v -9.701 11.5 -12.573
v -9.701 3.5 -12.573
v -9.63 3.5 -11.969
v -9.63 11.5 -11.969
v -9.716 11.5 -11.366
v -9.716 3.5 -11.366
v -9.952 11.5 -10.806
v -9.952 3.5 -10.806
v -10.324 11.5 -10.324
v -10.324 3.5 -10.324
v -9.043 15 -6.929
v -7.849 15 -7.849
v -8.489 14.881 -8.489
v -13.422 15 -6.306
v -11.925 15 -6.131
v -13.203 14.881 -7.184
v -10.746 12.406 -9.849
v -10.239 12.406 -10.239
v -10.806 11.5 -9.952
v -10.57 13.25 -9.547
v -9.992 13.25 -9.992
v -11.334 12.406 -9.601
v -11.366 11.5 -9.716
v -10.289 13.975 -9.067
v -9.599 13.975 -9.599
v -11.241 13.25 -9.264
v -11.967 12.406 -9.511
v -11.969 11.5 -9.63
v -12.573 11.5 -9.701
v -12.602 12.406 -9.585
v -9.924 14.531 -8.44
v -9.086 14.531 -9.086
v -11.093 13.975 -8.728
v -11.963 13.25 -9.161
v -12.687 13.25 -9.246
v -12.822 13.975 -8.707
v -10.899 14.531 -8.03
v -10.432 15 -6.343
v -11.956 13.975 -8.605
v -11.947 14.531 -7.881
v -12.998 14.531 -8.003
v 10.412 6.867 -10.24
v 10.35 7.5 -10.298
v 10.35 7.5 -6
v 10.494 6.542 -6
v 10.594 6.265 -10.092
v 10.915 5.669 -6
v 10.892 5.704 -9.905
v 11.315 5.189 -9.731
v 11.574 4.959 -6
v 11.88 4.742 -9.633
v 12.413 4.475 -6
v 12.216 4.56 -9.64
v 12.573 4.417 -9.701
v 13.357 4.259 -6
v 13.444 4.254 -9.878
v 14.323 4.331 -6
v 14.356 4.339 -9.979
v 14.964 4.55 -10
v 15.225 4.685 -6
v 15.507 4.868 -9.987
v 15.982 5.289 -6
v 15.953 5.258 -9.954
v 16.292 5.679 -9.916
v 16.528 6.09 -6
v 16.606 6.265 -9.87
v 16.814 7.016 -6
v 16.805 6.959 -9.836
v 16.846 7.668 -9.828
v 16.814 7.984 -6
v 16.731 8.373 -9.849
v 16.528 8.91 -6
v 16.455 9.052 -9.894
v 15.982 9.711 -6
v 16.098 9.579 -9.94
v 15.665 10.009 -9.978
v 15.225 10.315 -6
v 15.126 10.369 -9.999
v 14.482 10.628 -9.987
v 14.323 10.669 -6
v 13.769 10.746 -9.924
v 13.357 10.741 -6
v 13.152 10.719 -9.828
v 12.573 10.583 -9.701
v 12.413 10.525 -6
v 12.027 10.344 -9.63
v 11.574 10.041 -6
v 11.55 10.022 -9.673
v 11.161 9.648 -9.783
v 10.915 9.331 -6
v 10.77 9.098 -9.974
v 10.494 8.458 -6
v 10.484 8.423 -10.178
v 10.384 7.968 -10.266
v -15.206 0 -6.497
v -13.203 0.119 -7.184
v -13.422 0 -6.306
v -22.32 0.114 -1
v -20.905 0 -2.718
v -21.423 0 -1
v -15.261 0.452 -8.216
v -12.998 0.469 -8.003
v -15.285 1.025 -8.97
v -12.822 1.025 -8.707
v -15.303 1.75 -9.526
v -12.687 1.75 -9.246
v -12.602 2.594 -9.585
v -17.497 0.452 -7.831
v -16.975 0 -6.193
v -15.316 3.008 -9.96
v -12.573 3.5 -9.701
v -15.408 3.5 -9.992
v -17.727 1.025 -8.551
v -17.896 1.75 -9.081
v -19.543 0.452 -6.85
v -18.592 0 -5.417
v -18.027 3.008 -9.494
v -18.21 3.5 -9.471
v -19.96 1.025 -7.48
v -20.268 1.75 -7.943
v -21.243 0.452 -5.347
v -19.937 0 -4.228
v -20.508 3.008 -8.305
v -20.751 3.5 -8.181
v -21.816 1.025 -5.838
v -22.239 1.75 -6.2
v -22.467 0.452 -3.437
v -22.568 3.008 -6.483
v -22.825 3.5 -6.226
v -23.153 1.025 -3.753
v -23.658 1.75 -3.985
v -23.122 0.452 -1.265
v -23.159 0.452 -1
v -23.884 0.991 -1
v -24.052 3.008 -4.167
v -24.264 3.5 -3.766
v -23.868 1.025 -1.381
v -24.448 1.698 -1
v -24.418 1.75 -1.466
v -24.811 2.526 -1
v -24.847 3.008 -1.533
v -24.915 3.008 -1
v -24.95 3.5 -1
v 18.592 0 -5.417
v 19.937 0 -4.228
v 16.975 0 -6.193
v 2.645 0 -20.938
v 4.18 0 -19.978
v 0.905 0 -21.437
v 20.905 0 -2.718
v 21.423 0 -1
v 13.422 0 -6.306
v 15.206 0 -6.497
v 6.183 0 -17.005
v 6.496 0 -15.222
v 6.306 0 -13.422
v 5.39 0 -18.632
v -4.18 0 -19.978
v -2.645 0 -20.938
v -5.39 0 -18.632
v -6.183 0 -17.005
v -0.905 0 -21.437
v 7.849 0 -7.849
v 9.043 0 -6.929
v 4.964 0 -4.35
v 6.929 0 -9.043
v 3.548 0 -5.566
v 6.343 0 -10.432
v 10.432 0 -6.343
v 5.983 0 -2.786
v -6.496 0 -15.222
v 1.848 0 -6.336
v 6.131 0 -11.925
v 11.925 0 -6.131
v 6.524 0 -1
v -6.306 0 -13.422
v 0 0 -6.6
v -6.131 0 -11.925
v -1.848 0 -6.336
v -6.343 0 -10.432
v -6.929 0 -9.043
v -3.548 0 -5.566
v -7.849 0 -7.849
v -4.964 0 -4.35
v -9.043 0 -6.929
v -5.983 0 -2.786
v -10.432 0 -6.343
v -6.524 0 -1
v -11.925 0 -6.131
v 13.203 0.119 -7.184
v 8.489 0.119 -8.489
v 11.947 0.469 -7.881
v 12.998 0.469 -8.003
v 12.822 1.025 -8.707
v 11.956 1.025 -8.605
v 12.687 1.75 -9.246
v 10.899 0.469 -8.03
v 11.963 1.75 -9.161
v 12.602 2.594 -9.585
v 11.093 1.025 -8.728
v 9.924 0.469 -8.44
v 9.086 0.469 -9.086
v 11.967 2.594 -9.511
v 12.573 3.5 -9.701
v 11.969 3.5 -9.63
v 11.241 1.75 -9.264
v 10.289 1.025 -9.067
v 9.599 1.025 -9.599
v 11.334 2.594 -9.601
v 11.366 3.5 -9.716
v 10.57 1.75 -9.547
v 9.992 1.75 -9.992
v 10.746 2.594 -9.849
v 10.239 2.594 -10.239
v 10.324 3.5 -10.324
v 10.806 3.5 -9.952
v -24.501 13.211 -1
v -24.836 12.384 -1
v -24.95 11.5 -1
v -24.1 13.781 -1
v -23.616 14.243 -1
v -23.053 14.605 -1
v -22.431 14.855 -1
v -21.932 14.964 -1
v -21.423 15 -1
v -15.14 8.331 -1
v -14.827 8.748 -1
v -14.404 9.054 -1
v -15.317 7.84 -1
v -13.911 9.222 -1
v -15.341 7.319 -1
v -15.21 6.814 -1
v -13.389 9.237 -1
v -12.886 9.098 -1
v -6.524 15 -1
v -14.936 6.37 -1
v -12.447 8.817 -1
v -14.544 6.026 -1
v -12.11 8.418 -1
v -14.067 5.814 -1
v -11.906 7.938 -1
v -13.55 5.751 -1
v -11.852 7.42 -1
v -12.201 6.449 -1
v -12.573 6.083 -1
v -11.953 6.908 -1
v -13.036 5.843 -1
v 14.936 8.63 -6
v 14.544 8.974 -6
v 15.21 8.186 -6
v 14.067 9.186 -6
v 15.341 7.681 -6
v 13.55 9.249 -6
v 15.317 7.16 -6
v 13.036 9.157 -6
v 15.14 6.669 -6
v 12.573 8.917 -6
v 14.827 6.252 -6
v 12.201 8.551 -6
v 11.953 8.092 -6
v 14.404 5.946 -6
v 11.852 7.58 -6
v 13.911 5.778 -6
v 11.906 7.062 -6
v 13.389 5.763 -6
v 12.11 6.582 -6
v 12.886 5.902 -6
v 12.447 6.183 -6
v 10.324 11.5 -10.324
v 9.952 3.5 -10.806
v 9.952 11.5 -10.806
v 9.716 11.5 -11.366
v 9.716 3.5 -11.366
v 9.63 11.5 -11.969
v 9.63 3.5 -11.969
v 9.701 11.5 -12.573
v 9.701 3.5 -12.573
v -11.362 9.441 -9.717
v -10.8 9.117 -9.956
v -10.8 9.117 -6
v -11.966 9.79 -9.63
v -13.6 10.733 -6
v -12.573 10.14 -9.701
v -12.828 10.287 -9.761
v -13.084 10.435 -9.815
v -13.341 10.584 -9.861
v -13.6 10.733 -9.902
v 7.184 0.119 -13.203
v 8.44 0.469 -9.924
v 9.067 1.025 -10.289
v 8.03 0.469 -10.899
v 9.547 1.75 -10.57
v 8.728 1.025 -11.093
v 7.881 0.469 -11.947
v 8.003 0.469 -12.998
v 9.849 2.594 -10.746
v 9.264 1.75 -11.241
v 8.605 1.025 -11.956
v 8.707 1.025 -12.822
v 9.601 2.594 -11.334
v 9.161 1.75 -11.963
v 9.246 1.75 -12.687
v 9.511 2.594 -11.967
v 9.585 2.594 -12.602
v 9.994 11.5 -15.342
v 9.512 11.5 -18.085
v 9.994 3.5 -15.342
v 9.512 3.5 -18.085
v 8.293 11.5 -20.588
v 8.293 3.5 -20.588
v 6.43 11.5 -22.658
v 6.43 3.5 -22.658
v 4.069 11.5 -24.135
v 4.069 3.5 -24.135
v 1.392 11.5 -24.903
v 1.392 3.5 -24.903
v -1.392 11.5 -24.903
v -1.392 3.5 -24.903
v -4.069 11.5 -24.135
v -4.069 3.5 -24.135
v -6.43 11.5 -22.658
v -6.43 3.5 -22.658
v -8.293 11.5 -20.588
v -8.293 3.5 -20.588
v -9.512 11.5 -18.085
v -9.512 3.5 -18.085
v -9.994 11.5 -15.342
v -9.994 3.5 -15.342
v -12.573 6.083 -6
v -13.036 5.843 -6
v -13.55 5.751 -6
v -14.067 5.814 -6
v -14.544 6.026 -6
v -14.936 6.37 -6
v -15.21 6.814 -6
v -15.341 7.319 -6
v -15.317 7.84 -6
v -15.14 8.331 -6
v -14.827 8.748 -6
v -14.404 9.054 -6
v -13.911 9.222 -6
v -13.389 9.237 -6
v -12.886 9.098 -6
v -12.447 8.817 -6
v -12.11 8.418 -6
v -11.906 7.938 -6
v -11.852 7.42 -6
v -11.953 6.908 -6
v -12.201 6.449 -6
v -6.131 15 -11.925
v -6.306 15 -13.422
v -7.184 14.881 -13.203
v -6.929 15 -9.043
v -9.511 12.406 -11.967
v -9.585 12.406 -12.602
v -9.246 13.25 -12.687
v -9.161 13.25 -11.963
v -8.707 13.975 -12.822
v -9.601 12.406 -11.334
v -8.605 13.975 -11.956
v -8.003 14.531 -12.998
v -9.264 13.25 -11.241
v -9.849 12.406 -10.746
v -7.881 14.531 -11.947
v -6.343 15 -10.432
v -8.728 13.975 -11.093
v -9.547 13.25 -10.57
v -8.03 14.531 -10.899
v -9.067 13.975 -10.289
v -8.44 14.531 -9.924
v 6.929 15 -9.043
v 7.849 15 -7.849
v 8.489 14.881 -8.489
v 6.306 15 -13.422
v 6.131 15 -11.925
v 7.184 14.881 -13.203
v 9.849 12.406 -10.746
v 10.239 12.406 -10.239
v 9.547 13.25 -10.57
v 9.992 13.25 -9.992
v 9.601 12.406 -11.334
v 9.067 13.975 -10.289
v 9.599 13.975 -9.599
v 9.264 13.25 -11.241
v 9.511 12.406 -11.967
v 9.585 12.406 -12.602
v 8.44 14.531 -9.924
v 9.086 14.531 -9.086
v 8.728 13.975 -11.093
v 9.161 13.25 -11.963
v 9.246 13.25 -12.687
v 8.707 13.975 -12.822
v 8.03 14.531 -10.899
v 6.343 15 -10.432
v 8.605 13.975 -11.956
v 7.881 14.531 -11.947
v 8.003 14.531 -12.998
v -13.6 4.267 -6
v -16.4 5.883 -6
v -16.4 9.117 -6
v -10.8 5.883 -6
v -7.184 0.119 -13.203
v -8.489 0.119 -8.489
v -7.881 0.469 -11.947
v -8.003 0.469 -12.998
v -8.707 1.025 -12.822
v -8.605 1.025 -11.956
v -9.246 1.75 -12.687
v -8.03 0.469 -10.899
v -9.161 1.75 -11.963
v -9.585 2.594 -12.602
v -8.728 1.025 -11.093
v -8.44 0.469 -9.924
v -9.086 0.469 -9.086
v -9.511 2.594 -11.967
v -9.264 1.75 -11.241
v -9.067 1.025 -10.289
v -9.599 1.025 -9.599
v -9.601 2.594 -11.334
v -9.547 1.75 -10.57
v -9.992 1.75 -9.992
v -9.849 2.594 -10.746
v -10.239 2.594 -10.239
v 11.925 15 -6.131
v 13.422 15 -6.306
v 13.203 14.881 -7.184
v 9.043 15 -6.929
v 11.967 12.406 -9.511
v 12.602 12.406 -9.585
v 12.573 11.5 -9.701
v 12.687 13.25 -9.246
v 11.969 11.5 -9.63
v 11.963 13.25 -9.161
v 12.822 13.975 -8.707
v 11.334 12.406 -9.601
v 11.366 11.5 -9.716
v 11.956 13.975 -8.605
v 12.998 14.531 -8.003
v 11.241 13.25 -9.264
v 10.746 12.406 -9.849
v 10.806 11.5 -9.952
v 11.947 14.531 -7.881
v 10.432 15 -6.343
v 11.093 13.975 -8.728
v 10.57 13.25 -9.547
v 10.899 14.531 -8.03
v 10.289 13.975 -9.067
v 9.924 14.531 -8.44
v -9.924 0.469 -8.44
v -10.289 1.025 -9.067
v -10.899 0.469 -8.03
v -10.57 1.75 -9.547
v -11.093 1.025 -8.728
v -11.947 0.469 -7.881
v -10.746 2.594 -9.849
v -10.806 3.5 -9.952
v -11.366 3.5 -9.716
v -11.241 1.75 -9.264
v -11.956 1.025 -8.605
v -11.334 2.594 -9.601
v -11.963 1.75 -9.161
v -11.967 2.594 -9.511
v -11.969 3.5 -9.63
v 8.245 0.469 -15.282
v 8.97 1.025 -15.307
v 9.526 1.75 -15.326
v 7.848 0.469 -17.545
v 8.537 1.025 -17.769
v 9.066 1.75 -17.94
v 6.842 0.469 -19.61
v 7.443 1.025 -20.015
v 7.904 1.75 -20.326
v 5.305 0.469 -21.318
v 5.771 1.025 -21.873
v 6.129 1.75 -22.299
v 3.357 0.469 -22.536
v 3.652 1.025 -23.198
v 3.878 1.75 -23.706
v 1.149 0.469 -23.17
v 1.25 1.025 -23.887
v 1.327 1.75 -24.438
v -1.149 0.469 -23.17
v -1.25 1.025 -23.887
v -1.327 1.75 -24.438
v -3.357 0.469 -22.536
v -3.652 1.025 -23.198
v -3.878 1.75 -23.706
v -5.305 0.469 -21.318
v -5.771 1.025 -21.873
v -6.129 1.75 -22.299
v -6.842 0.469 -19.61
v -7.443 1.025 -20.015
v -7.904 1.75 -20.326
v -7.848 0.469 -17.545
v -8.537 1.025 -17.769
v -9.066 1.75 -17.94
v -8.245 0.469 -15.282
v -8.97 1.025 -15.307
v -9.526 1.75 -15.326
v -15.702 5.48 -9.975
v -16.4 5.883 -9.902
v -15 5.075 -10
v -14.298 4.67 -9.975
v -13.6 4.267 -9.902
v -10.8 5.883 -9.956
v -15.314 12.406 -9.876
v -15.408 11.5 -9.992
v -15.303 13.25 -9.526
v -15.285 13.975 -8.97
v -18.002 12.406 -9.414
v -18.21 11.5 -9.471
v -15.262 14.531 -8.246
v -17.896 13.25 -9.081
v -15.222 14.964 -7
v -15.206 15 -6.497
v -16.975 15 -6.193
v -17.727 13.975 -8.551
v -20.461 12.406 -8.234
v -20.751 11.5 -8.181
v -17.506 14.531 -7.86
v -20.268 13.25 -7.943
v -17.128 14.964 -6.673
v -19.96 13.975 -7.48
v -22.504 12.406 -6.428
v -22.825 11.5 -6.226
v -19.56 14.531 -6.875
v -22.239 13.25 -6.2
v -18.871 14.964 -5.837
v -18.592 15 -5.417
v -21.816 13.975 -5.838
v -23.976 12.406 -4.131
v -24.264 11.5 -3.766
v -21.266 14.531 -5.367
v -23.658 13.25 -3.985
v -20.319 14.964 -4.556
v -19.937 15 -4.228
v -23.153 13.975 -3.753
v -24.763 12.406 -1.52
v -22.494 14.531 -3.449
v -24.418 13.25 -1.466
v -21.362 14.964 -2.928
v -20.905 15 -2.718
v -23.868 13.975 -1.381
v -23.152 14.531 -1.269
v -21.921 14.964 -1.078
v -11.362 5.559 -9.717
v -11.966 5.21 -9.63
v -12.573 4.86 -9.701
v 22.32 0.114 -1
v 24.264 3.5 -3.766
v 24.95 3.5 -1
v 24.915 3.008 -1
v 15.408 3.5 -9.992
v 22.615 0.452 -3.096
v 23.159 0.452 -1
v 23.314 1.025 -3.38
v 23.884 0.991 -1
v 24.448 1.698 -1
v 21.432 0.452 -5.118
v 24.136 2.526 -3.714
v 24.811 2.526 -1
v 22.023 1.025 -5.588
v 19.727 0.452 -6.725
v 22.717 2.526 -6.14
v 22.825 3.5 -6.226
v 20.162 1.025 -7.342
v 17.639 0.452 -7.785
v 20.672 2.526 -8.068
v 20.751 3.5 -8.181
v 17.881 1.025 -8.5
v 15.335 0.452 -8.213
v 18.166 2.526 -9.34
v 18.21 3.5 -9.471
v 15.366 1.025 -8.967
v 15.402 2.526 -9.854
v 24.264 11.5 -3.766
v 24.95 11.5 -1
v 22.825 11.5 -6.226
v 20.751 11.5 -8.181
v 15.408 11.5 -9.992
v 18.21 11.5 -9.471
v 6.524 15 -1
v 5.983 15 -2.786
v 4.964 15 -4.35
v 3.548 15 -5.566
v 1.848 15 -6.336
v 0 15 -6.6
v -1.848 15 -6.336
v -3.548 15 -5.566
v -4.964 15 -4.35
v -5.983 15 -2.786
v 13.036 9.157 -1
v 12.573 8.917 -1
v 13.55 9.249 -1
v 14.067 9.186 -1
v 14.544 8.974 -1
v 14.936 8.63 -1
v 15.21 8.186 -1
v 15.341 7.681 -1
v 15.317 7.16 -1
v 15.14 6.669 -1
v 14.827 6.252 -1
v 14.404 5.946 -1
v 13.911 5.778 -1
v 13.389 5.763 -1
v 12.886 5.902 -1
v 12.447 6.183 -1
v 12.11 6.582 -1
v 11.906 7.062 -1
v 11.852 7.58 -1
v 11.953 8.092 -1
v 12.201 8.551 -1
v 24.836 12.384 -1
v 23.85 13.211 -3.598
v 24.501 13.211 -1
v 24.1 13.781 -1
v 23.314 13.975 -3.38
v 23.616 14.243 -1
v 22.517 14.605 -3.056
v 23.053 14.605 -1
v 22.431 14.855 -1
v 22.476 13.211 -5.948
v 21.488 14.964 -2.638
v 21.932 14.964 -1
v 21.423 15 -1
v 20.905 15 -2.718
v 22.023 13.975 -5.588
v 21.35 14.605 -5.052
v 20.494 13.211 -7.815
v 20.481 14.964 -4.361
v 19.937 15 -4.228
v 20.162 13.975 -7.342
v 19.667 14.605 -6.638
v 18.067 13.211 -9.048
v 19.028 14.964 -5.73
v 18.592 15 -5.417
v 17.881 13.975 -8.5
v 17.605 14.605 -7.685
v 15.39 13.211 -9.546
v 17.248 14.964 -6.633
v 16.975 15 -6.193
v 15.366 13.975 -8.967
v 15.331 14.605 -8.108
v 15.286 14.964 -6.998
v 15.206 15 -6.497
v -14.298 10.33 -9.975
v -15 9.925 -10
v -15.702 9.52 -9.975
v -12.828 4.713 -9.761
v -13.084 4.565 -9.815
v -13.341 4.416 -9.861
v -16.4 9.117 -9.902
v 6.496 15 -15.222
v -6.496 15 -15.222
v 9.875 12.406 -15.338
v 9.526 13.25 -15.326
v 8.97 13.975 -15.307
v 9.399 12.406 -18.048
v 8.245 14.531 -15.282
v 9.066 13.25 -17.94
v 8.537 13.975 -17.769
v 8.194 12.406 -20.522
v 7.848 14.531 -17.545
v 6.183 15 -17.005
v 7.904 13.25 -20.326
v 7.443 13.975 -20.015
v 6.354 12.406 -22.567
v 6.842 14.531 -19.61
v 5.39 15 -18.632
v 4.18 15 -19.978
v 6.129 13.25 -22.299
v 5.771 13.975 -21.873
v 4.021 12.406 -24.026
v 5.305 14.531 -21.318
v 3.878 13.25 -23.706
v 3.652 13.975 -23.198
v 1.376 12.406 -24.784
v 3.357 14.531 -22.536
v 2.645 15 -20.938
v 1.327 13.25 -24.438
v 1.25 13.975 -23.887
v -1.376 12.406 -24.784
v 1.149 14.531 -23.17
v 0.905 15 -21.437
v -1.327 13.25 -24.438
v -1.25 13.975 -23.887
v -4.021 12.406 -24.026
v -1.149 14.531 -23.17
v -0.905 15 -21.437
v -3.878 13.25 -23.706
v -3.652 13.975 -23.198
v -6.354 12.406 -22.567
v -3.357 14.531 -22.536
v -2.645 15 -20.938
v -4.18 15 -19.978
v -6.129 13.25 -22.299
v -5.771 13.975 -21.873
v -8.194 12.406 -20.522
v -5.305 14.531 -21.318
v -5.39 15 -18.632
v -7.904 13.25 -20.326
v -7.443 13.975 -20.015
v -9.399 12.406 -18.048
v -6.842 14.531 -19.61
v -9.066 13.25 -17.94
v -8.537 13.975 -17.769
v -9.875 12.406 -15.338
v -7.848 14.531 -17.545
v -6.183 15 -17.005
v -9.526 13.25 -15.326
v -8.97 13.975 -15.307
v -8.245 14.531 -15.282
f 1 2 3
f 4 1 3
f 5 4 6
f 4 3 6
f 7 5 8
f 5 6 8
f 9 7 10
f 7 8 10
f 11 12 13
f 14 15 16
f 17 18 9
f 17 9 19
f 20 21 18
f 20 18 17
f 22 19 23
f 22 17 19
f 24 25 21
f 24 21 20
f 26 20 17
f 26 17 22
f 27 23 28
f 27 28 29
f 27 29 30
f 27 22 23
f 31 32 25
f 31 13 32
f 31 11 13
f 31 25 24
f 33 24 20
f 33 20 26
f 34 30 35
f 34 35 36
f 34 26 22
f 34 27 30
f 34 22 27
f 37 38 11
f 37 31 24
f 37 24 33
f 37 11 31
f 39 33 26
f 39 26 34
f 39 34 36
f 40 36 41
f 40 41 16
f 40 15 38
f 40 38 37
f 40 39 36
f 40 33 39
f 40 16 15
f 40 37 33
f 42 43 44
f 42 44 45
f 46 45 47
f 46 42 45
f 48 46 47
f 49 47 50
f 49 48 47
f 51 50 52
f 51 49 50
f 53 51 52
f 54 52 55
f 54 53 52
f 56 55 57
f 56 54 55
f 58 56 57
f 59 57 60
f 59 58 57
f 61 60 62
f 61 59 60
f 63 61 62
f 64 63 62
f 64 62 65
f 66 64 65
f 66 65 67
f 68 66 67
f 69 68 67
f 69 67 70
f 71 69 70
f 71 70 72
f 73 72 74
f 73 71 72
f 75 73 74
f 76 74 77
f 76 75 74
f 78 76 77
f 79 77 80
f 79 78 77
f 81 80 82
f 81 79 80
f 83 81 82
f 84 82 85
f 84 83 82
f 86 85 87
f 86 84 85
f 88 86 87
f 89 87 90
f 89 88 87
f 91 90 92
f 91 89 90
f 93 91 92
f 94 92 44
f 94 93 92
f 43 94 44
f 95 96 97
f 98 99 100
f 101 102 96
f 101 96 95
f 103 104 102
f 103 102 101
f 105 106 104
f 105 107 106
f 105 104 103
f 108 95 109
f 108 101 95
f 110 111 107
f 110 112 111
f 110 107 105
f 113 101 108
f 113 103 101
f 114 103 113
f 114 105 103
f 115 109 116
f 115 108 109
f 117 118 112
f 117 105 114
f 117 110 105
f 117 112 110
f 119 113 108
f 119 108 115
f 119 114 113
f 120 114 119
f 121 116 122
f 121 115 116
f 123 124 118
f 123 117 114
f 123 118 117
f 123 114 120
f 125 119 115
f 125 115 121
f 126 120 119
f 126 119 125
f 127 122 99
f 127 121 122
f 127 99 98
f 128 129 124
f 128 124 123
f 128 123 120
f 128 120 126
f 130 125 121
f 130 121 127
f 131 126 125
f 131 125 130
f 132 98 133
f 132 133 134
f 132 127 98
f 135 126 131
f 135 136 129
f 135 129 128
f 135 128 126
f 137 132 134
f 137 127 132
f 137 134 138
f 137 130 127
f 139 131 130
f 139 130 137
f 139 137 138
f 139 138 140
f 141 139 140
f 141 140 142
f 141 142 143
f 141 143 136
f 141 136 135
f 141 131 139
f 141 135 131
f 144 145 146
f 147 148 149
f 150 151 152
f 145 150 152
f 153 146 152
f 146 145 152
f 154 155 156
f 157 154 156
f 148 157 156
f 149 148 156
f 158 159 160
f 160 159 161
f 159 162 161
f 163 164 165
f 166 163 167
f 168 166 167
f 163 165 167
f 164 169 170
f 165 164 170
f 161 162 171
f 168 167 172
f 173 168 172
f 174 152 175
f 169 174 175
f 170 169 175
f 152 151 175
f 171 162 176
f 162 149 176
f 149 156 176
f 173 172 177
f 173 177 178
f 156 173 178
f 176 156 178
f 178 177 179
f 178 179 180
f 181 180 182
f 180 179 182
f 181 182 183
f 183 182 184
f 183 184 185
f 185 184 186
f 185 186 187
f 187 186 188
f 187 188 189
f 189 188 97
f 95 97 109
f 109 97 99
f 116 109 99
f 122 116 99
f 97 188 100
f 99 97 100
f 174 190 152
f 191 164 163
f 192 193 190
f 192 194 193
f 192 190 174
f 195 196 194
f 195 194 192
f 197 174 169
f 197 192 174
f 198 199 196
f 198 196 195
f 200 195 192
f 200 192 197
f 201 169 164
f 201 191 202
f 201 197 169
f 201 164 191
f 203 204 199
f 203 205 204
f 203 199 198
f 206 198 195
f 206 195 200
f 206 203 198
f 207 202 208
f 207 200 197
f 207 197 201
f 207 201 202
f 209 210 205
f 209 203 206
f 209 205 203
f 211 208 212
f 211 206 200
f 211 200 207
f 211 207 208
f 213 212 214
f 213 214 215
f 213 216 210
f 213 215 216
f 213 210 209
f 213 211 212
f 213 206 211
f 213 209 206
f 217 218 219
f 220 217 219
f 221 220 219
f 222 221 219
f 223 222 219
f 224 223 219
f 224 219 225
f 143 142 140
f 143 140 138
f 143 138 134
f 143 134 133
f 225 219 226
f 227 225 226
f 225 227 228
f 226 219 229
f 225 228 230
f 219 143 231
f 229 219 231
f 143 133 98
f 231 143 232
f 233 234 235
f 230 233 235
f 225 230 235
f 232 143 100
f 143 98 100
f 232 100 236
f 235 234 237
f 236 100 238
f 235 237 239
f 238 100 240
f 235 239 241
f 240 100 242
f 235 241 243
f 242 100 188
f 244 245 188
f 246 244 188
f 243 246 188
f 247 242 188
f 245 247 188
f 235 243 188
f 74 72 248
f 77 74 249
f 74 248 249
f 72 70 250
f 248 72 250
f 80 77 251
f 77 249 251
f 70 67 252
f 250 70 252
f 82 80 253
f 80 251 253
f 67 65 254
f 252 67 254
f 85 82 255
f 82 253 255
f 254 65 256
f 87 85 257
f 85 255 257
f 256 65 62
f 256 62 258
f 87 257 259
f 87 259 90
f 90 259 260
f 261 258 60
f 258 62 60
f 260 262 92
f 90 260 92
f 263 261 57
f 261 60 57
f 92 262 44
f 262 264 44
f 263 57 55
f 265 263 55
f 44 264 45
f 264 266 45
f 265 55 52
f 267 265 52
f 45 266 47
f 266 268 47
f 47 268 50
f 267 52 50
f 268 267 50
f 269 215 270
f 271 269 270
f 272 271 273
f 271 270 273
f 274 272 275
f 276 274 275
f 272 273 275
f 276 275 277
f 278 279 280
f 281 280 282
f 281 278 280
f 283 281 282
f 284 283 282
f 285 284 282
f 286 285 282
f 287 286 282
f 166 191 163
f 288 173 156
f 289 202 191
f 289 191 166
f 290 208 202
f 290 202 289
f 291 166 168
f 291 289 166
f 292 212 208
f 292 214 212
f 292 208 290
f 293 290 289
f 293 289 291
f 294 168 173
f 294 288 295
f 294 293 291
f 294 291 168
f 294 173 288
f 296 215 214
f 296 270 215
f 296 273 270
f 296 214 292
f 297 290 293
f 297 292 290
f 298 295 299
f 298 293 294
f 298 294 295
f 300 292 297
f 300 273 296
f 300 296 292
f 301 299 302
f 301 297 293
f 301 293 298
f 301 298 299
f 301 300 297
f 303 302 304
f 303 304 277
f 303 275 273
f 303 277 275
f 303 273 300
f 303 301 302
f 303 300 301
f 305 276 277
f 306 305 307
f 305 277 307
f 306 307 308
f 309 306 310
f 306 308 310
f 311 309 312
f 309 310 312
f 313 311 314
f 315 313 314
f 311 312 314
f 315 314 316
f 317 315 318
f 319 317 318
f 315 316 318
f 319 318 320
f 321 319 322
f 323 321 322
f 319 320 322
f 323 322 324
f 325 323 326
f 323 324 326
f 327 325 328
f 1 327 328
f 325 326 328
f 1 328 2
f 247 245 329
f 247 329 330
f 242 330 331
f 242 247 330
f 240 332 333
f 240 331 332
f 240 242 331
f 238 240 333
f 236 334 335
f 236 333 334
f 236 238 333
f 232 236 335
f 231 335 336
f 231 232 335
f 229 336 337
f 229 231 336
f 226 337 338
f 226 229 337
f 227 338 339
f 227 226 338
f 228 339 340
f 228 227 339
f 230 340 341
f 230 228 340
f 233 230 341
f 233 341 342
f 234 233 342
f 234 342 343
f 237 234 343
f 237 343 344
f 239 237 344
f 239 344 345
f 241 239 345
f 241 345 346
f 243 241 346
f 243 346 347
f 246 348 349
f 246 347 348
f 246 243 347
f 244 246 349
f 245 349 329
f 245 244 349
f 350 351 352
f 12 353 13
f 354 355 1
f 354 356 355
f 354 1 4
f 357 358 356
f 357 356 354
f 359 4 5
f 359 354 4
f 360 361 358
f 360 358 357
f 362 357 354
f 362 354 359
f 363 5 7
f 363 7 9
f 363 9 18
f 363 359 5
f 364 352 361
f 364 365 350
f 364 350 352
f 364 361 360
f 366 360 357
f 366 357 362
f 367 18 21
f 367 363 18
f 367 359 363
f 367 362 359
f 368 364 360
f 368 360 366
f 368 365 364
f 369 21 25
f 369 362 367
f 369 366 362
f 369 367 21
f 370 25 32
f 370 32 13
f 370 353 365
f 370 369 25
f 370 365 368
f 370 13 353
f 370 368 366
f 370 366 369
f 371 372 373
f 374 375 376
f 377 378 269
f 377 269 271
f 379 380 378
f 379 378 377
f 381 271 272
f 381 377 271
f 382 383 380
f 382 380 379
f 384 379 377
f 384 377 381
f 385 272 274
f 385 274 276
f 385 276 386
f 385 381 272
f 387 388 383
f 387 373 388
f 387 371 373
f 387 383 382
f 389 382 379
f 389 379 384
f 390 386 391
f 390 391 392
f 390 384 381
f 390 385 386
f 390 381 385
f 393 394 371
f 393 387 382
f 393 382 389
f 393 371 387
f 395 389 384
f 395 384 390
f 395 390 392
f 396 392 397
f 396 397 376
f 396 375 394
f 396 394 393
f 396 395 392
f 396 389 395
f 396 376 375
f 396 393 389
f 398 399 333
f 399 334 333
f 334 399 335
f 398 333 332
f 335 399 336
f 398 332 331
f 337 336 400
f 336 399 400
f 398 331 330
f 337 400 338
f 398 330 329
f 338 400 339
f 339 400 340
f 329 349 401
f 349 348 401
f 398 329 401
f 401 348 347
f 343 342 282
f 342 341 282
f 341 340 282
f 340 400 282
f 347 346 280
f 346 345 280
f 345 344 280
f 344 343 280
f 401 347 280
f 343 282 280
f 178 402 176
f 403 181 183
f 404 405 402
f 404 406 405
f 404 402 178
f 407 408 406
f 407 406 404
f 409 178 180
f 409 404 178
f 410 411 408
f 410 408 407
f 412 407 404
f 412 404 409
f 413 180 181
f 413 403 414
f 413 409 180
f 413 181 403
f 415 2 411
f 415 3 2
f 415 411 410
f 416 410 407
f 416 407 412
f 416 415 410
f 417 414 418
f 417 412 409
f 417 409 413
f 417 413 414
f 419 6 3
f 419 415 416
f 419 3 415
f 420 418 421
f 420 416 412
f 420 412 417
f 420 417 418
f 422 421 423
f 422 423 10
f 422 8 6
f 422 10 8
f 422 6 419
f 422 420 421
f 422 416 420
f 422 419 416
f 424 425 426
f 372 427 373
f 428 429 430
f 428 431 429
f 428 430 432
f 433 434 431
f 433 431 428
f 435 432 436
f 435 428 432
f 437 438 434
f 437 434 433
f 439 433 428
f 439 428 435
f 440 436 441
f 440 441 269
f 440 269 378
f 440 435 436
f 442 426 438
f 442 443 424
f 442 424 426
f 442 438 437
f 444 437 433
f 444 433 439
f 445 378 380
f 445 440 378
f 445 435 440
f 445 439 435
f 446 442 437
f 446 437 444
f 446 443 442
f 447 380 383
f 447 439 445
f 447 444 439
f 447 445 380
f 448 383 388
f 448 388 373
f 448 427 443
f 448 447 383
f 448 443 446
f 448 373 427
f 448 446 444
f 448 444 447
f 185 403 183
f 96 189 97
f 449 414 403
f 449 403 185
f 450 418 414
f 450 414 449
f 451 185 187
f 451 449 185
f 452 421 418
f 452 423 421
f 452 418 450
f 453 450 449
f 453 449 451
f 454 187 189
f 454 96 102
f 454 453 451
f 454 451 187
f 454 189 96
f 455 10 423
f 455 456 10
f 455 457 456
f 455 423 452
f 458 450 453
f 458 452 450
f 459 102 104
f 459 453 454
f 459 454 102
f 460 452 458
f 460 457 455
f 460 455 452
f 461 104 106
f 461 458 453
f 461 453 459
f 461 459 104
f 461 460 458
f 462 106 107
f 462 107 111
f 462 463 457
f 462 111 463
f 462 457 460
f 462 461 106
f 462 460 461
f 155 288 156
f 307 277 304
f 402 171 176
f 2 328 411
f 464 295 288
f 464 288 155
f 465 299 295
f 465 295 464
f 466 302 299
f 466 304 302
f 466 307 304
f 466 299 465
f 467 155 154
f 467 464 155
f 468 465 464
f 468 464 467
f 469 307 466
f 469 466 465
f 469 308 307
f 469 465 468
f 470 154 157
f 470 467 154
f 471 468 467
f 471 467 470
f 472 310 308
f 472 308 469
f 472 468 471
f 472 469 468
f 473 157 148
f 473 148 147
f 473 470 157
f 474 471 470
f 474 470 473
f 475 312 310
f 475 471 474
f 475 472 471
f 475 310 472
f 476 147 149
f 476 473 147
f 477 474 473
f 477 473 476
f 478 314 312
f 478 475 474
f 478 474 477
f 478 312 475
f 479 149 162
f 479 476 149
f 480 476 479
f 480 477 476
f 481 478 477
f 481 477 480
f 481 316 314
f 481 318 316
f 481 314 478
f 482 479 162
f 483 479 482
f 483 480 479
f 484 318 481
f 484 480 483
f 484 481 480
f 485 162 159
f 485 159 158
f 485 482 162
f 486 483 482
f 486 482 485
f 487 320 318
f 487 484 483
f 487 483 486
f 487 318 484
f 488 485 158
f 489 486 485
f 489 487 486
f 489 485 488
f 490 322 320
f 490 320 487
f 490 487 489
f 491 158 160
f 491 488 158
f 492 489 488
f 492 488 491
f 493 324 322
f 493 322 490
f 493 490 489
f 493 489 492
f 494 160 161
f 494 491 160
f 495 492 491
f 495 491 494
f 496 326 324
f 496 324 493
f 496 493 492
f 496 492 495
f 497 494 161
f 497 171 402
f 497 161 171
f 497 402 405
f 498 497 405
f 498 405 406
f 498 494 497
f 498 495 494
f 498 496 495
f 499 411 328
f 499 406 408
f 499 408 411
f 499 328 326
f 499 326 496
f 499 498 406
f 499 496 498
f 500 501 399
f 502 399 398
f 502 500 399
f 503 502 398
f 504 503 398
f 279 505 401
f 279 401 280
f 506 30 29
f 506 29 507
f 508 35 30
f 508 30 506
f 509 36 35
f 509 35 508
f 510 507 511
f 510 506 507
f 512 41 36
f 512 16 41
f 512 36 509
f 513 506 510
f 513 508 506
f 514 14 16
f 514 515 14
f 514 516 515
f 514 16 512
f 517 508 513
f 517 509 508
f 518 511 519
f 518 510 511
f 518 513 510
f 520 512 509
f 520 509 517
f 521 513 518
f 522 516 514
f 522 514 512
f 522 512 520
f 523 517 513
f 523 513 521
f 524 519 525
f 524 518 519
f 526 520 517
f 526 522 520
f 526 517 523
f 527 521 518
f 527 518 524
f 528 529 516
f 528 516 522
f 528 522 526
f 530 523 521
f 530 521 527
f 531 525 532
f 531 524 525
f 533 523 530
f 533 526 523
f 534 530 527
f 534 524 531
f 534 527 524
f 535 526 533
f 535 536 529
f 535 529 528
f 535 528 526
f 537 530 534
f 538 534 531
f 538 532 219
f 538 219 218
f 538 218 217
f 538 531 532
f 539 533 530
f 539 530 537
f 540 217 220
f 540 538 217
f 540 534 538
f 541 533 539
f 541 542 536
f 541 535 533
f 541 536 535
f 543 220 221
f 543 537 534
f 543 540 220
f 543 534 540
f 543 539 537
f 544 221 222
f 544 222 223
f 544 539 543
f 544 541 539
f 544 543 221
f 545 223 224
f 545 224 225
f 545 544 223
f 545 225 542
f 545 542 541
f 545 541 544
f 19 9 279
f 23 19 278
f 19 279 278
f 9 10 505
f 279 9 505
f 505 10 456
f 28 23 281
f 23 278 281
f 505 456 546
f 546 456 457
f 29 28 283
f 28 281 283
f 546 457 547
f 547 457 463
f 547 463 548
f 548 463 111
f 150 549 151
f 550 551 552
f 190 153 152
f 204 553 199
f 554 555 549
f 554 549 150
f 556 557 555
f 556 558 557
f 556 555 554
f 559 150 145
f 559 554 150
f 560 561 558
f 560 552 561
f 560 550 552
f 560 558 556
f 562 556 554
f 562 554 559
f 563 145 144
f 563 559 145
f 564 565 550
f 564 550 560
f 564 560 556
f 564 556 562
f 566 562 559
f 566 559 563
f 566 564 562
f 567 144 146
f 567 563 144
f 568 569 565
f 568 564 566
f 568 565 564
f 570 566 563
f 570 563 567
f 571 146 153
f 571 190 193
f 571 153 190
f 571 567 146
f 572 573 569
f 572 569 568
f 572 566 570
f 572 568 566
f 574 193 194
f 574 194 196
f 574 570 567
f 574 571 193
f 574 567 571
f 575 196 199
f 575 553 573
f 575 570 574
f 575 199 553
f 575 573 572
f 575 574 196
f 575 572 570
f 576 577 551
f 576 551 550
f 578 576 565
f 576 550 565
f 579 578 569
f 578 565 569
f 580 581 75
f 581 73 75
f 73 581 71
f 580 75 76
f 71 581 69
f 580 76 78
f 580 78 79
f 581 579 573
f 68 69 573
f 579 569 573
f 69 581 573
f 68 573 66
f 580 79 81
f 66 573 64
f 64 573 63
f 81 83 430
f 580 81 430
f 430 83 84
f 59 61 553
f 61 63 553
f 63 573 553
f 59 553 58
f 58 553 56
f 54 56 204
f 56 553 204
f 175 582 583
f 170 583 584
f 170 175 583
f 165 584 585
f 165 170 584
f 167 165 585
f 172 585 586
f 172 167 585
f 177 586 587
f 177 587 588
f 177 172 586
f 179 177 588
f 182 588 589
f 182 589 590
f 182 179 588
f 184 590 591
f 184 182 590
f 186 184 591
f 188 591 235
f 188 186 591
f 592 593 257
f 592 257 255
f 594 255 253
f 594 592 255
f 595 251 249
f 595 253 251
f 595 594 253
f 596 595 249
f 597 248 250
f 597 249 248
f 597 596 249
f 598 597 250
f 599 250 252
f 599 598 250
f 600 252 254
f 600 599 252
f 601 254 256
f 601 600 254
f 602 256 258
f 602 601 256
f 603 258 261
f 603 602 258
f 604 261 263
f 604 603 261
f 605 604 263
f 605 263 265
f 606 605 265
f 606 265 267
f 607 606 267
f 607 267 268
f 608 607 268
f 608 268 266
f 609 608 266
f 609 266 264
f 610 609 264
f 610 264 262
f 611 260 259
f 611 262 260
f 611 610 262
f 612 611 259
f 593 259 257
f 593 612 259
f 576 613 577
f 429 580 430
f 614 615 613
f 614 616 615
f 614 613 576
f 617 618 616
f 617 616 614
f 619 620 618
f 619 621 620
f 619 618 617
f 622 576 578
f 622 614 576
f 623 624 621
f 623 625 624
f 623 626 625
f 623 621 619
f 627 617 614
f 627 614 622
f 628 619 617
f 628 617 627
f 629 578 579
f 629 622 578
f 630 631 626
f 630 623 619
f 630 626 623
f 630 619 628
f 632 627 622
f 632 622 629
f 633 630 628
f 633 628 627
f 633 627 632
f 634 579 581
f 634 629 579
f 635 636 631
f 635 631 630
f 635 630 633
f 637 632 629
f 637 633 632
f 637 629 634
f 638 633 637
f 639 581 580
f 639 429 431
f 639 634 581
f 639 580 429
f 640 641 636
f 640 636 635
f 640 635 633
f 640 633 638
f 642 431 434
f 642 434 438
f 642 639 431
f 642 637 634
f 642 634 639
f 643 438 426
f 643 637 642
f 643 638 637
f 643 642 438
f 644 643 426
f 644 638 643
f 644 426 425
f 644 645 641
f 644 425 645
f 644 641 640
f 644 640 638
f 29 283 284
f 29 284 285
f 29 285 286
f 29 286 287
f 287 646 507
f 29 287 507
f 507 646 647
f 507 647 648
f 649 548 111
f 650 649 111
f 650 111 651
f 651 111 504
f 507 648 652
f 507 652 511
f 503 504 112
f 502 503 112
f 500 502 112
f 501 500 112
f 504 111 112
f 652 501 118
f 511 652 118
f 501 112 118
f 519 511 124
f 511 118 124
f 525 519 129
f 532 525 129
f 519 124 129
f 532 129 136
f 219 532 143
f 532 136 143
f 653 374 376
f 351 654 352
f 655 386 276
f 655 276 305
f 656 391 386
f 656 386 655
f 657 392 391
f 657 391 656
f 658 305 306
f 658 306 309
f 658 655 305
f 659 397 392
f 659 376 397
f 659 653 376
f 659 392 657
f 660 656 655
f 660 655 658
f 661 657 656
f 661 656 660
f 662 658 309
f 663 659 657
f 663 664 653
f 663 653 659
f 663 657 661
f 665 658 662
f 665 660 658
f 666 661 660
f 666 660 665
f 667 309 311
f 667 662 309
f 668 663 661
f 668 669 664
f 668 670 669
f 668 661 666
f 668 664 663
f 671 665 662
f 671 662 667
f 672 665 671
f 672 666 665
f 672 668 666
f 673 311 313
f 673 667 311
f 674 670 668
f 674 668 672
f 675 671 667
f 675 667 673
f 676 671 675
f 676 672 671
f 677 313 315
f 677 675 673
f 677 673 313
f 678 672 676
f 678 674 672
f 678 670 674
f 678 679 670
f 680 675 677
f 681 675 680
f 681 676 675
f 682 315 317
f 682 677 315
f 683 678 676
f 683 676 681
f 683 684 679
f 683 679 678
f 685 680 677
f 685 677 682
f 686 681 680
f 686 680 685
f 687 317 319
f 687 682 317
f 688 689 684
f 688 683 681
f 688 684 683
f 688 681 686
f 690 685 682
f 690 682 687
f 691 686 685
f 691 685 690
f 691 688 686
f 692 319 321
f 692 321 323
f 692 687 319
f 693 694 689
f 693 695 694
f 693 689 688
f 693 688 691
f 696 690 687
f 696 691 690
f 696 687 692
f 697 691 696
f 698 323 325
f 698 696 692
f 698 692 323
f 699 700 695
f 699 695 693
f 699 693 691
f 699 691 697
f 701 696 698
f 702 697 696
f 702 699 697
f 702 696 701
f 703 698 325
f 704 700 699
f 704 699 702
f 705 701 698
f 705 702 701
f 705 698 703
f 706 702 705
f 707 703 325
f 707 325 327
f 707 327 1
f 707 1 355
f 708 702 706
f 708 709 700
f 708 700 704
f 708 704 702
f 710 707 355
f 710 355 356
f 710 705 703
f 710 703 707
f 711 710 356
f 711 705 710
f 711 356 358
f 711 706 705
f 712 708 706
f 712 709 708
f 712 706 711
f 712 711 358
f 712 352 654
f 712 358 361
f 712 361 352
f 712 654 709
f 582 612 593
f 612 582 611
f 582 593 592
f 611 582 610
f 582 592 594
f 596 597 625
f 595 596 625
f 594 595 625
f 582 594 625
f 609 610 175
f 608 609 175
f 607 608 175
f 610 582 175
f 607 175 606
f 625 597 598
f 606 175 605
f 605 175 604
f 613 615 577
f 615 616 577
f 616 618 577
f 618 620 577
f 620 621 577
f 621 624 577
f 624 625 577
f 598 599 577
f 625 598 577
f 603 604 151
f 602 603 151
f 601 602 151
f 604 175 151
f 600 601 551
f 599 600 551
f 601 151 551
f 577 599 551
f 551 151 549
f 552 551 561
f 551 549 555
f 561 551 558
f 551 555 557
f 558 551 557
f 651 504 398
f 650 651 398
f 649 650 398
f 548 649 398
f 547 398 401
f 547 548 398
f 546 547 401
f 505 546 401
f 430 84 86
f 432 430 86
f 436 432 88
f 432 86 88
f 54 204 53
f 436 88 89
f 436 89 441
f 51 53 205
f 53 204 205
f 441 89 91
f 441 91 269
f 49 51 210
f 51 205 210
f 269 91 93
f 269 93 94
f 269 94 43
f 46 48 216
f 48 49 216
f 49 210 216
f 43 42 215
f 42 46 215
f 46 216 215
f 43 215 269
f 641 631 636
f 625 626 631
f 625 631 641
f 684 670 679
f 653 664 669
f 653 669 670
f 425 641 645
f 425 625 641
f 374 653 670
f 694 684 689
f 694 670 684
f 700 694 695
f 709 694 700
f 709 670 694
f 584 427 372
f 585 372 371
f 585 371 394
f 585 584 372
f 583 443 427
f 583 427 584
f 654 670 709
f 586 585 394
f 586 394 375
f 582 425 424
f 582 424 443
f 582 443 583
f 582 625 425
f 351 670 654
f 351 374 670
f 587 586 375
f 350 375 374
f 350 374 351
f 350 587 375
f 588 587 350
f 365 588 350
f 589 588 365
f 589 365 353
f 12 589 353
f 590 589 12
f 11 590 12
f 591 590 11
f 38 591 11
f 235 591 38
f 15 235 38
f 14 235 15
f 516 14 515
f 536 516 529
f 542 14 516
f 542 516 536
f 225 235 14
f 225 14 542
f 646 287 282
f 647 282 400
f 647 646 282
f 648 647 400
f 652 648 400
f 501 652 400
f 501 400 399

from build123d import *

# Parameters (mm, degrees)
BOSS_EXTRUDE1_DEPTH = 15
BOSS_EXTRUDE2_DEPTH = 15
CUT_EXTRUDE1_REACH  = 40.406
SKETCH2_R           = 1.75
CUT_EXTRUDE4_START  = -15
SKETCH5_W           = 78.790180628
SKETCH5_H           = 1
CUT_EXTRUDE4_DEPTH  = 15
SKETCH3_R           = 3.25
CUT_EXTRUDE2_DEPTH  = 9
FILLET1_R           = 3.5


with BuildPart() as part:
    # Sketch1 → Boss-Extrude1 (new body)
    with BuildSketch(Plane(origin=(0, 0, 0), x_dir=(1, 0, 0), z_dir=(0, 1, 0))):
        with BuildLine():
            Line((-6.6, 0), (-14.6, 0))
            ThreePointArc((-14.6, 0), (0, 14.6), (14.6, 0))
            Line((14.6, 0), (6.6, 0))
            ThreePointArc((6.6, 0), (0, 6.6), (-6.6, 0))
        make_face()
    extrude(amount=BOSS_EXTRUDE1_DEPTH)

    # Sketch6 → Boss-Extrude2 (add)
    with BuildSketch(Plane.XZ):
        with BuildLine():
            Line((-25, 0), (-8.641827511, 0))
            ThreePointArc((-8.641827511, 0), (0, -8.641827511), (8.641827511, 0))
            Line((8.641827511, 0), (25, 0))
            ThreePointArc((25, 0), (21.153421014, -7.882601717), (12.572918035, -9.70099341))
            ThreePointArc((12.572918035, -9.70099341), (11.366290804, -9.716055468), (10.323759005, -10.323759005))
            ThreePointArc((10.323759005, -10.323759005), (9.716055468, -11.366290804), (9.70099341, -12.572918035))
            ThreePointArc((9.70099341, -12.572918035), (0, -25), (-9.70099341, -12.572918035))
            ThreePointArc((-9.70099341, -12.572918035), (-9.716055468, -11.366290804), (-10.323759005, -10.323759005))
            ThreePointArc((-10.323759005, -10.323759005), (-11.366290804, -9.716055468), (-12.572918035, -9.70099341))
            ThreePointArc((-12.572918035, -9.70099341), (-21.153421014, -7.882601717), (-25, 0))
        make_face()
    extrude(amount=-BOSS_EXTRUDE2_DEPTH)

    # Sketch2 → Cut-Extrude1 (cut, up to next)
    with BuildSketch(Plane(origin=(0, 0, 0), x_dir=(-1, 0, 0), z_dir=(0, 0, -1)), mode=Mode.PRIVATE) as cut_extrude1_sk1:
        with Locations(Location((-13.6, 7.5, 0), (0, 0, 54.062388323))):
            Circle(SKETCH2_R)
    cut_extrude1_tool1 = extrude(cut_extrude1_sk1.sketch, amount=CUT_EXTRUDE1_REACH, mode=Mode.PRIVATE) & part.part
    # Sketch2 → Cut-Extrude1 (cut, up to next)
    with BuildSketch(Plane(origin=(0, 0, 0), x_dir=(-1, 0, 0), z_dir=(0, 0, -1)), mode=Mode.PRIVATE) as cut_extrude1_sk2:
        with Locations(Location((13.6, 7.5, 0), (0, 0, 234.062388323))):
            Circle(SKETCH2_R)
    cut_extrude1_tool2 = extrude(cut_extrude1_sk2.sketch, amount=CUT_EXTRUDE1_REACH, mode=Mode.PRIVATE) & part.part
    add(cut_extrude1_tool1.solids().sort_by_distance((13.6, 7.5, 0))[0], mode=Mode.SUBTRACT)
    add(cut_extrude1_tool2.solids().sort_by_distance((-13.6, 7.5, 0))[0], mode=Mode.SUBTRACT)

    # Sketch5 → Cut-Extrude4 (cut)
    with BuildSketch(Plane(origin=(0, 15, 0), x_dir=(1, 0, 0), z_dir=(0, 1, 0)).offset(CUT_EXTRUDE4_START)):
        with Locations((-1.565702307, 0.5)):
            Rectangle(SKETCH5_W, SKETCH5_H)
    extrude(amount=CUT_EXTRUDE4_DEPTH, mode=Mode.SUBTRACT)

    # Sketch3 → Cut-Extrude2 (cut)
    with BuildSketch(Plane.XY.offset(-15)):
        with Locations(Location((13.6, 7.5, 0), (0, 0, 180))):
            Circle(SKETCH3_R)
        Polygon((-10.8, 5.883419246), (-10.8, 9.116580754), (-13.6, 10.733161507), (-16.4, 9.116580754), (-16.4, 5.883419246), (-13.6, 4.266838493), align=None)
    extrude(amount=CUT_EXTRUDE2_DEPTH, mode=Mode.SUBTRACT)

    # Fillet1
    fillet1_edges = [part.edges().sort_by_distance(p)[0] for p in [
        (10.323759005, 0, -10.323759005),
        (20.751080157, 0, -8.180774843),
        (-10.323759005, 0, -10.323759005),
        (0, 0, -25),
        (10.323759005, 15, -10.323759005),
        (-10.323759005, 15, -10.323759005),
        (-20.751080157, 15, -8.180774843),
        (0, 15, -25),
        (-20.751080157, 0, -8.180774843),
        (20.751080157, 15, -8.180774843),
    ]]
    fillet(fillet1_edges, radius=FILLET1_R)


solid = part.part
